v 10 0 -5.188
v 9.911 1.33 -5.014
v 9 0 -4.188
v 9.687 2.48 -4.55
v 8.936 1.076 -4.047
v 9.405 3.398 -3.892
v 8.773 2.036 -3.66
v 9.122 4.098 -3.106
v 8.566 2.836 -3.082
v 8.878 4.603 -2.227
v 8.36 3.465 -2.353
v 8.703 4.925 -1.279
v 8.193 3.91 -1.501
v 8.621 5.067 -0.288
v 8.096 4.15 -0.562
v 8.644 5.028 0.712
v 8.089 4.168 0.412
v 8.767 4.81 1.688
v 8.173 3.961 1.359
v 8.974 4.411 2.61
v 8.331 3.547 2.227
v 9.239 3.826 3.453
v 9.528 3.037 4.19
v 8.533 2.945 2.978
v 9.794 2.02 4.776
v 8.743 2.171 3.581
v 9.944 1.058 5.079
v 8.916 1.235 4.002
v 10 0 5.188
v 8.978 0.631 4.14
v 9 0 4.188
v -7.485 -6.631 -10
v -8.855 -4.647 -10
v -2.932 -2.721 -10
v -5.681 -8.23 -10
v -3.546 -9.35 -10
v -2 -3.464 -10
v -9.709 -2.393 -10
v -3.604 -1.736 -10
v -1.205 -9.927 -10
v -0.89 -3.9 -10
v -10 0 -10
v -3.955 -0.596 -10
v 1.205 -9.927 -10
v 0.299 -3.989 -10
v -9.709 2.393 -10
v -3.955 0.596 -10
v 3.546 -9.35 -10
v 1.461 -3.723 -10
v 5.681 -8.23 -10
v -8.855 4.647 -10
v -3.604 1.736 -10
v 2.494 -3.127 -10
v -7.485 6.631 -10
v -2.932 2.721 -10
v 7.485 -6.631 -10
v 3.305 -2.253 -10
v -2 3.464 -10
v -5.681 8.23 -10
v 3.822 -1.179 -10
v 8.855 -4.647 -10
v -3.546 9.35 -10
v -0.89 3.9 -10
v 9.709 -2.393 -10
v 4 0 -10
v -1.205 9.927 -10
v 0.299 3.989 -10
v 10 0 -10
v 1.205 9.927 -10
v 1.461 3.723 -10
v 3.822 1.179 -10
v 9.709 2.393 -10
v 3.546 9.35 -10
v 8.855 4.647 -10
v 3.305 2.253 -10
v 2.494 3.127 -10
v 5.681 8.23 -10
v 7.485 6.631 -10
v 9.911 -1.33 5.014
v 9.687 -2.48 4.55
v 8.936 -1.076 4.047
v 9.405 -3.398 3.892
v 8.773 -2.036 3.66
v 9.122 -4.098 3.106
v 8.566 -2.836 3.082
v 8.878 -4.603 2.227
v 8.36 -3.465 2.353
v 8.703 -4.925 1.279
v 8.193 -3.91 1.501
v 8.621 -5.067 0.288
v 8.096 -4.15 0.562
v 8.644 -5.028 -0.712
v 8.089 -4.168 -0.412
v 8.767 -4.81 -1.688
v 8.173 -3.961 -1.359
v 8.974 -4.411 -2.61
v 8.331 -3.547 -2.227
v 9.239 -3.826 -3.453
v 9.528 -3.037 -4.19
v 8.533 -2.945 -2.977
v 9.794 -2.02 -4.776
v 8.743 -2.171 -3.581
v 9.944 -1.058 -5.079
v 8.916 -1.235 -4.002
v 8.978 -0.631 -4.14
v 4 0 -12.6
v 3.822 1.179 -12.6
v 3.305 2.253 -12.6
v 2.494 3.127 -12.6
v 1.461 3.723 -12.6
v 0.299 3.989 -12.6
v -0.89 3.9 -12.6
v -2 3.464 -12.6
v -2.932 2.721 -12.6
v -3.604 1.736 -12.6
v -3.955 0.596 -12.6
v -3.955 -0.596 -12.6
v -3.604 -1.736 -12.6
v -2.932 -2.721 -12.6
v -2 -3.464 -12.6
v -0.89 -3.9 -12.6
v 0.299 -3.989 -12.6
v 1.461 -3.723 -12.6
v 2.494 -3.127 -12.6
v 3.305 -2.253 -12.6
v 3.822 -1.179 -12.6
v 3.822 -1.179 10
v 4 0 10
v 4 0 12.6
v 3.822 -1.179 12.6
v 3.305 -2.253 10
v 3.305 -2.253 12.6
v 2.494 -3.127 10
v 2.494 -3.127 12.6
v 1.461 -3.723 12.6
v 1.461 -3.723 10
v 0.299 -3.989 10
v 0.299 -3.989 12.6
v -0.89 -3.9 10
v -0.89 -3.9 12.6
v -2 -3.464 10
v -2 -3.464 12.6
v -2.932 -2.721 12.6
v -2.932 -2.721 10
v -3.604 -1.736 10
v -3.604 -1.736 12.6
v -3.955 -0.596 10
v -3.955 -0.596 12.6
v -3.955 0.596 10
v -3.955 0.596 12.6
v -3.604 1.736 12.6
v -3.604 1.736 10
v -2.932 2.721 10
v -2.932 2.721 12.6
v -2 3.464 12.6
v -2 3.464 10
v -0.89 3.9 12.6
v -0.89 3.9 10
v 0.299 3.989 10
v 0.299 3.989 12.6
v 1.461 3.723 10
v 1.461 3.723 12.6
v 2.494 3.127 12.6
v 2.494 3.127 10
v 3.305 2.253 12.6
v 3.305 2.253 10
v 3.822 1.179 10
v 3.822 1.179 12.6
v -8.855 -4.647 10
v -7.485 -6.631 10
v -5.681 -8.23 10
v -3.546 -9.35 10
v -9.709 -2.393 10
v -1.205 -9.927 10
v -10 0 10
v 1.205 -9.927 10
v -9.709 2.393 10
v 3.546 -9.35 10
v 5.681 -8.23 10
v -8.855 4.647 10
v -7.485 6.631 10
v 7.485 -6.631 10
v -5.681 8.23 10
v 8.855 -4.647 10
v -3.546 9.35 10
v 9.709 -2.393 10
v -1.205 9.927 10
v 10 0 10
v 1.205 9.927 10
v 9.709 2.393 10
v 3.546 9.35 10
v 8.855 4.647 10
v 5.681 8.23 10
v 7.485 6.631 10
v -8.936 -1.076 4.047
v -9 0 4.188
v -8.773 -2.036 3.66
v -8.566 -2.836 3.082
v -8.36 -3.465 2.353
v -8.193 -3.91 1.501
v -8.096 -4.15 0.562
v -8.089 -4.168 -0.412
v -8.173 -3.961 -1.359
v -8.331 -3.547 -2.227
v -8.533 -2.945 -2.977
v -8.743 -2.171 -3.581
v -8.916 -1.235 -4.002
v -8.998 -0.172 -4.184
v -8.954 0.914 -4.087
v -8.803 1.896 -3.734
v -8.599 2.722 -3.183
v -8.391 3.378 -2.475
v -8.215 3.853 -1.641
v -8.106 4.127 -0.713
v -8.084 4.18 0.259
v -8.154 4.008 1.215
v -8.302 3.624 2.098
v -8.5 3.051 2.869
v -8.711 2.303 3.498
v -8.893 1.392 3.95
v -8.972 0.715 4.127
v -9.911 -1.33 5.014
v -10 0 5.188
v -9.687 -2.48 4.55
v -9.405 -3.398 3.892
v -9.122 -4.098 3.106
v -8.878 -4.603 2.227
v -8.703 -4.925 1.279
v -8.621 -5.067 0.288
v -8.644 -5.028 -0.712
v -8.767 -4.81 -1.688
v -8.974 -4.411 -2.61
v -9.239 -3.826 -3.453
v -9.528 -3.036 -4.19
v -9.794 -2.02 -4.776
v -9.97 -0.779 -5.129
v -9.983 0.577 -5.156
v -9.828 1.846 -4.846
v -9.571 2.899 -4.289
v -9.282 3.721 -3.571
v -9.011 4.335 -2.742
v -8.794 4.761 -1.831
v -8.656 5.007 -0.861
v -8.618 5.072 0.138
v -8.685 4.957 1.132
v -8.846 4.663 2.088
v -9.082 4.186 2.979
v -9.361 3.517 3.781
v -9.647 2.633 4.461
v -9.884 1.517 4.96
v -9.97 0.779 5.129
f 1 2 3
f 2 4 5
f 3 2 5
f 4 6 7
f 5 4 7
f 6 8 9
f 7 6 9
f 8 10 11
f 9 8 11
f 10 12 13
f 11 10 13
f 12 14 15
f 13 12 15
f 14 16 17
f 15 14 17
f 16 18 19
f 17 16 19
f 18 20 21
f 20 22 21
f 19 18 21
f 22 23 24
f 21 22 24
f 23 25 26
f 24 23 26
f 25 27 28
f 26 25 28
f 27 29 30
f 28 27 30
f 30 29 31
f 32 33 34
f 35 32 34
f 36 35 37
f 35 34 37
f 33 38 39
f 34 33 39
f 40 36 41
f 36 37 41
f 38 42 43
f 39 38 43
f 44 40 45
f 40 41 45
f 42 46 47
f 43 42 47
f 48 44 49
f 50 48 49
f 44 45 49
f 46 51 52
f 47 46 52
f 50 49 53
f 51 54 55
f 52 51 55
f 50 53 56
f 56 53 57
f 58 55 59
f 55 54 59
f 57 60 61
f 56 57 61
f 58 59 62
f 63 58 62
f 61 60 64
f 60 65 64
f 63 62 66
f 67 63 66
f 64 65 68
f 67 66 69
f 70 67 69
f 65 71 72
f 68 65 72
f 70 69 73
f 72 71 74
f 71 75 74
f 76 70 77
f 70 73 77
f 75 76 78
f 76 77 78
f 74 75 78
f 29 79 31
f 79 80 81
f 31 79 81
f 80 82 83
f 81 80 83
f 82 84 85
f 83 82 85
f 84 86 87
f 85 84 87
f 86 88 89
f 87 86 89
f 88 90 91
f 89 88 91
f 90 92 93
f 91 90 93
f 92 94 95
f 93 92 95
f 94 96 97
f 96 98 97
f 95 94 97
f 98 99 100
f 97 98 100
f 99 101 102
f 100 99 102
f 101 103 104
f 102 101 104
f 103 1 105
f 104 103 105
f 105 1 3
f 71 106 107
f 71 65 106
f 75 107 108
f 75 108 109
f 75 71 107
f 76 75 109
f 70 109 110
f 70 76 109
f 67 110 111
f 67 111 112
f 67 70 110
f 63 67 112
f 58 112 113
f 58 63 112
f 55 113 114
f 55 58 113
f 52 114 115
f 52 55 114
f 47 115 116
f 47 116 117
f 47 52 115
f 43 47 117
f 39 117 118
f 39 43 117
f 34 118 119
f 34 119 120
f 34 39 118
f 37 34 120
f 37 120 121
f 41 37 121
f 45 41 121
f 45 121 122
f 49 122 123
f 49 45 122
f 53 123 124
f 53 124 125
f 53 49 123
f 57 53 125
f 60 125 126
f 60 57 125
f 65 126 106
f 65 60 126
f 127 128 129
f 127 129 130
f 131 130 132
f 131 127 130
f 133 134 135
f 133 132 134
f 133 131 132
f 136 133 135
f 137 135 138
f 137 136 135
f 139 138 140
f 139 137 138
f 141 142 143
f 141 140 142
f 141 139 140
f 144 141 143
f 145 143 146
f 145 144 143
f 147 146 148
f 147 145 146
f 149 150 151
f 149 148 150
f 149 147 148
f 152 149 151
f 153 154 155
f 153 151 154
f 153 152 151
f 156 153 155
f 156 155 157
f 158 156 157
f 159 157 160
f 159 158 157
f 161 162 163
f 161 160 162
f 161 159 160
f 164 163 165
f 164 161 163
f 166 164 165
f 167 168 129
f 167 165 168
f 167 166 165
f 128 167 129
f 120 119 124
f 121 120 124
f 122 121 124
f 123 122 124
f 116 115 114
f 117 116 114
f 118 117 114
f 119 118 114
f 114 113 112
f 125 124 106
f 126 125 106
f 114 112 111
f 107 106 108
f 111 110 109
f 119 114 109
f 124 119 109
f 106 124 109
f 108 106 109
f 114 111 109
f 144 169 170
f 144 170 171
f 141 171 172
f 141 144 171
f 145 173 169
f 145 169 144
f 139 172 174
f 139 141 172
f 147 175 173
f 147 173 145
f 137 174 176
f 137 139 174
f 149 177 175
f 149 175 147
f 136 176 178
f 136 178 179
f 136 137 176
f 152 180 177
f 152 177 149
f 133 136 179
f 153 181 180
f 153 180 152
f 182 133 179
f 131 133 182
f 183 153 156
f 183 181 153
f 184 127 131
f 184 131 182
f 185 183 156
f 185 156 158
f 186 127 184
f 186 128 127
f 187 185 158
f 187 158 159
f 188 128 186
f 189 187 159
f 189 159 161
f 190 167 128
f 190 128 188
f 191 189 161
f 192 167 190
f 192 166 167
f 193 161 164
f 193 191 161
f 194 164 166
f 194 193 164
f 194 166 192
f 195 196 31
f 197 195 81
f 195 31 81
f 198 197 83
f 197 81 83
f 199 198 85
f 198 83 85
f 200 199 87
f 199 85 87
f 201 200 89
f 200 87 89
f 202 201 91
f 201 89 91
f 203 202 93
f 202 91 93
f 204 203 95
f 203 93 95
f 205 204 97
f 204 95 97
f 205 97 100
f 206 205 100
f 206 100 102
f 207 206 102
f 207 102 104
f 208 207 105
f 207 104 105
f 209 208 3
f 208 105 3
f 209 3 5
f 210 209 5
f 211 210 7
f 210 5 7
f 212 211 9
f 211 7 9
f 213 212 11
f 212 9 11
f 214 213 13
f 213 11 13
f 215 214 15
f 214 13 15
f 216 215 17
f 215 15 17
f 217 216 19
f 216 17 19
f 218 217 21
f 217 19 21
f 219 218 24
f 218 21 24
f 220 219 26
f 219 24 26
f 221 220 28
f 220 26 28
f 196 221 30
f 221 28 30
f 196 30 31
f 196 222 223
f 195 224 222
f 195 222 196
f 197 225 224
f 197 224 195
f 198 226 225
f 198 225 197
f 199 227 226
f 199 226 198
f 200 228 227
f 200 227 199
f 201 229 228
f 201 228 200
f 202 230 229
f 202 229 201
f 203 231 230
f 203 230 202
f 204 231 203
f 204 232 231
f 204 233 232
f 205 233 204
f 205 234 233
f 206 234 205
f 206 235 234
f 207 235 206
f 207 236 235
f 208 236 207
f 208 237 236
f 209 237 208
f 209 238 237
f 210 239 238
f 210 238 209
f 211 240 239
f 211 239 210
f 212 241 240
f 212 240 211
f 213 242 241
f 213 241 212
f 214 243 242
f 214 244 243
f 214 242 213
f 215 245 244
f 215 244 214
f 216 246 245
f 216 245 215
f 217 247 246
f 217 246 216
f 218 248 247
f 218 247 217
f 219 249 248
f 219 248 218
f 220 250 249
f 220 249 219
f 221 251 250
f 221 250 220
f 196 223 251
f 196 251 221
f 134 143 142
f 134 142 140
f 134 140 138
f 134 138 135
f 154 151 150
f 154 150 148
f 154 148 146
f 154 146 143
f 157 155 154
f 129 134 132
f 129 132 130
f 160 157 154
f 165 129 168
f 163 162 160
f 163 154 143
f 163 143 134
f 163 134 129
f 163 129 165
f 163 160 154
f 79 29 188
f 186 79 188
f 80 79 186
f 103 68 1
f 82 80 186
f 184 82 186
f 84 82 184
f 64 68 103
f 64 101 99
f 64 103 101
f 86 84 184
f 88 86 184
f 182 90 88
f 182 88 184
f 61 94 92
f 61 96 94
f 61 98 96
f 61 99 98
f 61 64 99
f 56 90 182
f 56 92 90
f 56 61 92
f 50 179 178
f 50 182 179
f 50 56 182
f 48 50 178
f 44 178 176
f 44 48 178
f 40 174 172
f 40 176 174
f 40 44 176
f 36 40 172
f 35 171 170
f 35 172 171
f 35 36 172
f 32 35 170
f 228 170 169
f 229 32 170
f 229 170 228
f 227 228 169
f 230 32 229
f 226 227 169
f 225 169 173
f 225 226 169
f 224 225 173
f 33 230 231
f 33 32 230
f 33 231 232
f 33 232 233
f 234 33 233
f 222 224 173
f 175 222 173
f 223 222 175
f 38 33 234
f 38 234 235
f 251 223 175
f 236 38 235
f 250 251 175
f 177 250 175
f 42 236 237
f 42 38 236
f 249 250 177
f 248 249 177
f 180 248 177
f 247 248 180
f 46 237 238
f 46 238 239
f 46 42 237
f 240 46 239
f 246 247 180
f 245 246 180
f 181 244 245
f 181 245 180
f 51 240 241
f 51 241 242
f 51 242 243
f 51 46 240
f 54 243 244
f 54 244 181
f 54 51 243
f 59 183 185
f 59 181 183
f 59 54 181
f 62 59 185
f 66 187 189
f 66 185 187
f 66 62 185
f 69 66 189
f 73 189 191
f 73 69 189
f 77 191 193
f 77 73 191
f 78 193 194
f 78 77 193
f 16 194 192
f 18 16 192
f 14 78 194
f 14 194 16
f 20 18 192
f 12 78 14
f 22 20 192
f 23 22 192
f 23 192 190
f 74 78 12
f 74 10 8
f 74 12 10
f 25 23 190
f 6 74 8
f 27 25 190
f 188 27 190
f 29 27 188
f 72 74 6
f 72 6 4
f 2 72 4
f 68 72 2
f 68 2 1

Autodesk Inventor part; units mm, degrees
ref_plane "YZ Plane" through (0, 0, 0) normal (1, 0, 0) x (0, 1, 0)
ref_plane "XZ Plane" through (0, 0, 0) normal (0, 1, 0) x (-1, 0, 0)
ref_plane "XY Plane" through (0, 0, 0) normal (0, 0, 1) x (1, 0, 0)
sketch "Sketch1" plane through (0, 0, 0) normal (0, 0, 1) x (1, 0, 0)
  circle A0 centre (0, 0) radius 10
  circle A1 centre (0, 0) radius 4
  point P0 (-10, 0)
  dimension "d0" = 20
  dimension "d1" = 8
extrude "Extrusion1" add sketch "Sketch1" along normal mid plane 25.2 contours A1
extrude "Extrusion2" add sketch "Sketch1" along normal mid plane 20
hole "Hole1" at (-10, 0, 0) direction (1, 0, 0) diameter 8.376 end through all thread size "M10x1.5" class "6H" standard "ISO Metric profile"
chamfer "Chamfer1" distance 1 angle 45 8 edges at (9.4815, 3.1784, 2.7271) (9.4815, -3.1783, 2.7272) (9.4815, -3.1784, -2.7271) (9.4815, 3.1783, -2.7272) (-9.4815, 3.1784, 2.7271) (-9.4815, 3.1783, -2.7272) (-9.4815, -3.1784, -2.7271) (-9.4815, -3.1783, 2.7272)
properties part number "BaseSpacer" material "Steel, Mild"
